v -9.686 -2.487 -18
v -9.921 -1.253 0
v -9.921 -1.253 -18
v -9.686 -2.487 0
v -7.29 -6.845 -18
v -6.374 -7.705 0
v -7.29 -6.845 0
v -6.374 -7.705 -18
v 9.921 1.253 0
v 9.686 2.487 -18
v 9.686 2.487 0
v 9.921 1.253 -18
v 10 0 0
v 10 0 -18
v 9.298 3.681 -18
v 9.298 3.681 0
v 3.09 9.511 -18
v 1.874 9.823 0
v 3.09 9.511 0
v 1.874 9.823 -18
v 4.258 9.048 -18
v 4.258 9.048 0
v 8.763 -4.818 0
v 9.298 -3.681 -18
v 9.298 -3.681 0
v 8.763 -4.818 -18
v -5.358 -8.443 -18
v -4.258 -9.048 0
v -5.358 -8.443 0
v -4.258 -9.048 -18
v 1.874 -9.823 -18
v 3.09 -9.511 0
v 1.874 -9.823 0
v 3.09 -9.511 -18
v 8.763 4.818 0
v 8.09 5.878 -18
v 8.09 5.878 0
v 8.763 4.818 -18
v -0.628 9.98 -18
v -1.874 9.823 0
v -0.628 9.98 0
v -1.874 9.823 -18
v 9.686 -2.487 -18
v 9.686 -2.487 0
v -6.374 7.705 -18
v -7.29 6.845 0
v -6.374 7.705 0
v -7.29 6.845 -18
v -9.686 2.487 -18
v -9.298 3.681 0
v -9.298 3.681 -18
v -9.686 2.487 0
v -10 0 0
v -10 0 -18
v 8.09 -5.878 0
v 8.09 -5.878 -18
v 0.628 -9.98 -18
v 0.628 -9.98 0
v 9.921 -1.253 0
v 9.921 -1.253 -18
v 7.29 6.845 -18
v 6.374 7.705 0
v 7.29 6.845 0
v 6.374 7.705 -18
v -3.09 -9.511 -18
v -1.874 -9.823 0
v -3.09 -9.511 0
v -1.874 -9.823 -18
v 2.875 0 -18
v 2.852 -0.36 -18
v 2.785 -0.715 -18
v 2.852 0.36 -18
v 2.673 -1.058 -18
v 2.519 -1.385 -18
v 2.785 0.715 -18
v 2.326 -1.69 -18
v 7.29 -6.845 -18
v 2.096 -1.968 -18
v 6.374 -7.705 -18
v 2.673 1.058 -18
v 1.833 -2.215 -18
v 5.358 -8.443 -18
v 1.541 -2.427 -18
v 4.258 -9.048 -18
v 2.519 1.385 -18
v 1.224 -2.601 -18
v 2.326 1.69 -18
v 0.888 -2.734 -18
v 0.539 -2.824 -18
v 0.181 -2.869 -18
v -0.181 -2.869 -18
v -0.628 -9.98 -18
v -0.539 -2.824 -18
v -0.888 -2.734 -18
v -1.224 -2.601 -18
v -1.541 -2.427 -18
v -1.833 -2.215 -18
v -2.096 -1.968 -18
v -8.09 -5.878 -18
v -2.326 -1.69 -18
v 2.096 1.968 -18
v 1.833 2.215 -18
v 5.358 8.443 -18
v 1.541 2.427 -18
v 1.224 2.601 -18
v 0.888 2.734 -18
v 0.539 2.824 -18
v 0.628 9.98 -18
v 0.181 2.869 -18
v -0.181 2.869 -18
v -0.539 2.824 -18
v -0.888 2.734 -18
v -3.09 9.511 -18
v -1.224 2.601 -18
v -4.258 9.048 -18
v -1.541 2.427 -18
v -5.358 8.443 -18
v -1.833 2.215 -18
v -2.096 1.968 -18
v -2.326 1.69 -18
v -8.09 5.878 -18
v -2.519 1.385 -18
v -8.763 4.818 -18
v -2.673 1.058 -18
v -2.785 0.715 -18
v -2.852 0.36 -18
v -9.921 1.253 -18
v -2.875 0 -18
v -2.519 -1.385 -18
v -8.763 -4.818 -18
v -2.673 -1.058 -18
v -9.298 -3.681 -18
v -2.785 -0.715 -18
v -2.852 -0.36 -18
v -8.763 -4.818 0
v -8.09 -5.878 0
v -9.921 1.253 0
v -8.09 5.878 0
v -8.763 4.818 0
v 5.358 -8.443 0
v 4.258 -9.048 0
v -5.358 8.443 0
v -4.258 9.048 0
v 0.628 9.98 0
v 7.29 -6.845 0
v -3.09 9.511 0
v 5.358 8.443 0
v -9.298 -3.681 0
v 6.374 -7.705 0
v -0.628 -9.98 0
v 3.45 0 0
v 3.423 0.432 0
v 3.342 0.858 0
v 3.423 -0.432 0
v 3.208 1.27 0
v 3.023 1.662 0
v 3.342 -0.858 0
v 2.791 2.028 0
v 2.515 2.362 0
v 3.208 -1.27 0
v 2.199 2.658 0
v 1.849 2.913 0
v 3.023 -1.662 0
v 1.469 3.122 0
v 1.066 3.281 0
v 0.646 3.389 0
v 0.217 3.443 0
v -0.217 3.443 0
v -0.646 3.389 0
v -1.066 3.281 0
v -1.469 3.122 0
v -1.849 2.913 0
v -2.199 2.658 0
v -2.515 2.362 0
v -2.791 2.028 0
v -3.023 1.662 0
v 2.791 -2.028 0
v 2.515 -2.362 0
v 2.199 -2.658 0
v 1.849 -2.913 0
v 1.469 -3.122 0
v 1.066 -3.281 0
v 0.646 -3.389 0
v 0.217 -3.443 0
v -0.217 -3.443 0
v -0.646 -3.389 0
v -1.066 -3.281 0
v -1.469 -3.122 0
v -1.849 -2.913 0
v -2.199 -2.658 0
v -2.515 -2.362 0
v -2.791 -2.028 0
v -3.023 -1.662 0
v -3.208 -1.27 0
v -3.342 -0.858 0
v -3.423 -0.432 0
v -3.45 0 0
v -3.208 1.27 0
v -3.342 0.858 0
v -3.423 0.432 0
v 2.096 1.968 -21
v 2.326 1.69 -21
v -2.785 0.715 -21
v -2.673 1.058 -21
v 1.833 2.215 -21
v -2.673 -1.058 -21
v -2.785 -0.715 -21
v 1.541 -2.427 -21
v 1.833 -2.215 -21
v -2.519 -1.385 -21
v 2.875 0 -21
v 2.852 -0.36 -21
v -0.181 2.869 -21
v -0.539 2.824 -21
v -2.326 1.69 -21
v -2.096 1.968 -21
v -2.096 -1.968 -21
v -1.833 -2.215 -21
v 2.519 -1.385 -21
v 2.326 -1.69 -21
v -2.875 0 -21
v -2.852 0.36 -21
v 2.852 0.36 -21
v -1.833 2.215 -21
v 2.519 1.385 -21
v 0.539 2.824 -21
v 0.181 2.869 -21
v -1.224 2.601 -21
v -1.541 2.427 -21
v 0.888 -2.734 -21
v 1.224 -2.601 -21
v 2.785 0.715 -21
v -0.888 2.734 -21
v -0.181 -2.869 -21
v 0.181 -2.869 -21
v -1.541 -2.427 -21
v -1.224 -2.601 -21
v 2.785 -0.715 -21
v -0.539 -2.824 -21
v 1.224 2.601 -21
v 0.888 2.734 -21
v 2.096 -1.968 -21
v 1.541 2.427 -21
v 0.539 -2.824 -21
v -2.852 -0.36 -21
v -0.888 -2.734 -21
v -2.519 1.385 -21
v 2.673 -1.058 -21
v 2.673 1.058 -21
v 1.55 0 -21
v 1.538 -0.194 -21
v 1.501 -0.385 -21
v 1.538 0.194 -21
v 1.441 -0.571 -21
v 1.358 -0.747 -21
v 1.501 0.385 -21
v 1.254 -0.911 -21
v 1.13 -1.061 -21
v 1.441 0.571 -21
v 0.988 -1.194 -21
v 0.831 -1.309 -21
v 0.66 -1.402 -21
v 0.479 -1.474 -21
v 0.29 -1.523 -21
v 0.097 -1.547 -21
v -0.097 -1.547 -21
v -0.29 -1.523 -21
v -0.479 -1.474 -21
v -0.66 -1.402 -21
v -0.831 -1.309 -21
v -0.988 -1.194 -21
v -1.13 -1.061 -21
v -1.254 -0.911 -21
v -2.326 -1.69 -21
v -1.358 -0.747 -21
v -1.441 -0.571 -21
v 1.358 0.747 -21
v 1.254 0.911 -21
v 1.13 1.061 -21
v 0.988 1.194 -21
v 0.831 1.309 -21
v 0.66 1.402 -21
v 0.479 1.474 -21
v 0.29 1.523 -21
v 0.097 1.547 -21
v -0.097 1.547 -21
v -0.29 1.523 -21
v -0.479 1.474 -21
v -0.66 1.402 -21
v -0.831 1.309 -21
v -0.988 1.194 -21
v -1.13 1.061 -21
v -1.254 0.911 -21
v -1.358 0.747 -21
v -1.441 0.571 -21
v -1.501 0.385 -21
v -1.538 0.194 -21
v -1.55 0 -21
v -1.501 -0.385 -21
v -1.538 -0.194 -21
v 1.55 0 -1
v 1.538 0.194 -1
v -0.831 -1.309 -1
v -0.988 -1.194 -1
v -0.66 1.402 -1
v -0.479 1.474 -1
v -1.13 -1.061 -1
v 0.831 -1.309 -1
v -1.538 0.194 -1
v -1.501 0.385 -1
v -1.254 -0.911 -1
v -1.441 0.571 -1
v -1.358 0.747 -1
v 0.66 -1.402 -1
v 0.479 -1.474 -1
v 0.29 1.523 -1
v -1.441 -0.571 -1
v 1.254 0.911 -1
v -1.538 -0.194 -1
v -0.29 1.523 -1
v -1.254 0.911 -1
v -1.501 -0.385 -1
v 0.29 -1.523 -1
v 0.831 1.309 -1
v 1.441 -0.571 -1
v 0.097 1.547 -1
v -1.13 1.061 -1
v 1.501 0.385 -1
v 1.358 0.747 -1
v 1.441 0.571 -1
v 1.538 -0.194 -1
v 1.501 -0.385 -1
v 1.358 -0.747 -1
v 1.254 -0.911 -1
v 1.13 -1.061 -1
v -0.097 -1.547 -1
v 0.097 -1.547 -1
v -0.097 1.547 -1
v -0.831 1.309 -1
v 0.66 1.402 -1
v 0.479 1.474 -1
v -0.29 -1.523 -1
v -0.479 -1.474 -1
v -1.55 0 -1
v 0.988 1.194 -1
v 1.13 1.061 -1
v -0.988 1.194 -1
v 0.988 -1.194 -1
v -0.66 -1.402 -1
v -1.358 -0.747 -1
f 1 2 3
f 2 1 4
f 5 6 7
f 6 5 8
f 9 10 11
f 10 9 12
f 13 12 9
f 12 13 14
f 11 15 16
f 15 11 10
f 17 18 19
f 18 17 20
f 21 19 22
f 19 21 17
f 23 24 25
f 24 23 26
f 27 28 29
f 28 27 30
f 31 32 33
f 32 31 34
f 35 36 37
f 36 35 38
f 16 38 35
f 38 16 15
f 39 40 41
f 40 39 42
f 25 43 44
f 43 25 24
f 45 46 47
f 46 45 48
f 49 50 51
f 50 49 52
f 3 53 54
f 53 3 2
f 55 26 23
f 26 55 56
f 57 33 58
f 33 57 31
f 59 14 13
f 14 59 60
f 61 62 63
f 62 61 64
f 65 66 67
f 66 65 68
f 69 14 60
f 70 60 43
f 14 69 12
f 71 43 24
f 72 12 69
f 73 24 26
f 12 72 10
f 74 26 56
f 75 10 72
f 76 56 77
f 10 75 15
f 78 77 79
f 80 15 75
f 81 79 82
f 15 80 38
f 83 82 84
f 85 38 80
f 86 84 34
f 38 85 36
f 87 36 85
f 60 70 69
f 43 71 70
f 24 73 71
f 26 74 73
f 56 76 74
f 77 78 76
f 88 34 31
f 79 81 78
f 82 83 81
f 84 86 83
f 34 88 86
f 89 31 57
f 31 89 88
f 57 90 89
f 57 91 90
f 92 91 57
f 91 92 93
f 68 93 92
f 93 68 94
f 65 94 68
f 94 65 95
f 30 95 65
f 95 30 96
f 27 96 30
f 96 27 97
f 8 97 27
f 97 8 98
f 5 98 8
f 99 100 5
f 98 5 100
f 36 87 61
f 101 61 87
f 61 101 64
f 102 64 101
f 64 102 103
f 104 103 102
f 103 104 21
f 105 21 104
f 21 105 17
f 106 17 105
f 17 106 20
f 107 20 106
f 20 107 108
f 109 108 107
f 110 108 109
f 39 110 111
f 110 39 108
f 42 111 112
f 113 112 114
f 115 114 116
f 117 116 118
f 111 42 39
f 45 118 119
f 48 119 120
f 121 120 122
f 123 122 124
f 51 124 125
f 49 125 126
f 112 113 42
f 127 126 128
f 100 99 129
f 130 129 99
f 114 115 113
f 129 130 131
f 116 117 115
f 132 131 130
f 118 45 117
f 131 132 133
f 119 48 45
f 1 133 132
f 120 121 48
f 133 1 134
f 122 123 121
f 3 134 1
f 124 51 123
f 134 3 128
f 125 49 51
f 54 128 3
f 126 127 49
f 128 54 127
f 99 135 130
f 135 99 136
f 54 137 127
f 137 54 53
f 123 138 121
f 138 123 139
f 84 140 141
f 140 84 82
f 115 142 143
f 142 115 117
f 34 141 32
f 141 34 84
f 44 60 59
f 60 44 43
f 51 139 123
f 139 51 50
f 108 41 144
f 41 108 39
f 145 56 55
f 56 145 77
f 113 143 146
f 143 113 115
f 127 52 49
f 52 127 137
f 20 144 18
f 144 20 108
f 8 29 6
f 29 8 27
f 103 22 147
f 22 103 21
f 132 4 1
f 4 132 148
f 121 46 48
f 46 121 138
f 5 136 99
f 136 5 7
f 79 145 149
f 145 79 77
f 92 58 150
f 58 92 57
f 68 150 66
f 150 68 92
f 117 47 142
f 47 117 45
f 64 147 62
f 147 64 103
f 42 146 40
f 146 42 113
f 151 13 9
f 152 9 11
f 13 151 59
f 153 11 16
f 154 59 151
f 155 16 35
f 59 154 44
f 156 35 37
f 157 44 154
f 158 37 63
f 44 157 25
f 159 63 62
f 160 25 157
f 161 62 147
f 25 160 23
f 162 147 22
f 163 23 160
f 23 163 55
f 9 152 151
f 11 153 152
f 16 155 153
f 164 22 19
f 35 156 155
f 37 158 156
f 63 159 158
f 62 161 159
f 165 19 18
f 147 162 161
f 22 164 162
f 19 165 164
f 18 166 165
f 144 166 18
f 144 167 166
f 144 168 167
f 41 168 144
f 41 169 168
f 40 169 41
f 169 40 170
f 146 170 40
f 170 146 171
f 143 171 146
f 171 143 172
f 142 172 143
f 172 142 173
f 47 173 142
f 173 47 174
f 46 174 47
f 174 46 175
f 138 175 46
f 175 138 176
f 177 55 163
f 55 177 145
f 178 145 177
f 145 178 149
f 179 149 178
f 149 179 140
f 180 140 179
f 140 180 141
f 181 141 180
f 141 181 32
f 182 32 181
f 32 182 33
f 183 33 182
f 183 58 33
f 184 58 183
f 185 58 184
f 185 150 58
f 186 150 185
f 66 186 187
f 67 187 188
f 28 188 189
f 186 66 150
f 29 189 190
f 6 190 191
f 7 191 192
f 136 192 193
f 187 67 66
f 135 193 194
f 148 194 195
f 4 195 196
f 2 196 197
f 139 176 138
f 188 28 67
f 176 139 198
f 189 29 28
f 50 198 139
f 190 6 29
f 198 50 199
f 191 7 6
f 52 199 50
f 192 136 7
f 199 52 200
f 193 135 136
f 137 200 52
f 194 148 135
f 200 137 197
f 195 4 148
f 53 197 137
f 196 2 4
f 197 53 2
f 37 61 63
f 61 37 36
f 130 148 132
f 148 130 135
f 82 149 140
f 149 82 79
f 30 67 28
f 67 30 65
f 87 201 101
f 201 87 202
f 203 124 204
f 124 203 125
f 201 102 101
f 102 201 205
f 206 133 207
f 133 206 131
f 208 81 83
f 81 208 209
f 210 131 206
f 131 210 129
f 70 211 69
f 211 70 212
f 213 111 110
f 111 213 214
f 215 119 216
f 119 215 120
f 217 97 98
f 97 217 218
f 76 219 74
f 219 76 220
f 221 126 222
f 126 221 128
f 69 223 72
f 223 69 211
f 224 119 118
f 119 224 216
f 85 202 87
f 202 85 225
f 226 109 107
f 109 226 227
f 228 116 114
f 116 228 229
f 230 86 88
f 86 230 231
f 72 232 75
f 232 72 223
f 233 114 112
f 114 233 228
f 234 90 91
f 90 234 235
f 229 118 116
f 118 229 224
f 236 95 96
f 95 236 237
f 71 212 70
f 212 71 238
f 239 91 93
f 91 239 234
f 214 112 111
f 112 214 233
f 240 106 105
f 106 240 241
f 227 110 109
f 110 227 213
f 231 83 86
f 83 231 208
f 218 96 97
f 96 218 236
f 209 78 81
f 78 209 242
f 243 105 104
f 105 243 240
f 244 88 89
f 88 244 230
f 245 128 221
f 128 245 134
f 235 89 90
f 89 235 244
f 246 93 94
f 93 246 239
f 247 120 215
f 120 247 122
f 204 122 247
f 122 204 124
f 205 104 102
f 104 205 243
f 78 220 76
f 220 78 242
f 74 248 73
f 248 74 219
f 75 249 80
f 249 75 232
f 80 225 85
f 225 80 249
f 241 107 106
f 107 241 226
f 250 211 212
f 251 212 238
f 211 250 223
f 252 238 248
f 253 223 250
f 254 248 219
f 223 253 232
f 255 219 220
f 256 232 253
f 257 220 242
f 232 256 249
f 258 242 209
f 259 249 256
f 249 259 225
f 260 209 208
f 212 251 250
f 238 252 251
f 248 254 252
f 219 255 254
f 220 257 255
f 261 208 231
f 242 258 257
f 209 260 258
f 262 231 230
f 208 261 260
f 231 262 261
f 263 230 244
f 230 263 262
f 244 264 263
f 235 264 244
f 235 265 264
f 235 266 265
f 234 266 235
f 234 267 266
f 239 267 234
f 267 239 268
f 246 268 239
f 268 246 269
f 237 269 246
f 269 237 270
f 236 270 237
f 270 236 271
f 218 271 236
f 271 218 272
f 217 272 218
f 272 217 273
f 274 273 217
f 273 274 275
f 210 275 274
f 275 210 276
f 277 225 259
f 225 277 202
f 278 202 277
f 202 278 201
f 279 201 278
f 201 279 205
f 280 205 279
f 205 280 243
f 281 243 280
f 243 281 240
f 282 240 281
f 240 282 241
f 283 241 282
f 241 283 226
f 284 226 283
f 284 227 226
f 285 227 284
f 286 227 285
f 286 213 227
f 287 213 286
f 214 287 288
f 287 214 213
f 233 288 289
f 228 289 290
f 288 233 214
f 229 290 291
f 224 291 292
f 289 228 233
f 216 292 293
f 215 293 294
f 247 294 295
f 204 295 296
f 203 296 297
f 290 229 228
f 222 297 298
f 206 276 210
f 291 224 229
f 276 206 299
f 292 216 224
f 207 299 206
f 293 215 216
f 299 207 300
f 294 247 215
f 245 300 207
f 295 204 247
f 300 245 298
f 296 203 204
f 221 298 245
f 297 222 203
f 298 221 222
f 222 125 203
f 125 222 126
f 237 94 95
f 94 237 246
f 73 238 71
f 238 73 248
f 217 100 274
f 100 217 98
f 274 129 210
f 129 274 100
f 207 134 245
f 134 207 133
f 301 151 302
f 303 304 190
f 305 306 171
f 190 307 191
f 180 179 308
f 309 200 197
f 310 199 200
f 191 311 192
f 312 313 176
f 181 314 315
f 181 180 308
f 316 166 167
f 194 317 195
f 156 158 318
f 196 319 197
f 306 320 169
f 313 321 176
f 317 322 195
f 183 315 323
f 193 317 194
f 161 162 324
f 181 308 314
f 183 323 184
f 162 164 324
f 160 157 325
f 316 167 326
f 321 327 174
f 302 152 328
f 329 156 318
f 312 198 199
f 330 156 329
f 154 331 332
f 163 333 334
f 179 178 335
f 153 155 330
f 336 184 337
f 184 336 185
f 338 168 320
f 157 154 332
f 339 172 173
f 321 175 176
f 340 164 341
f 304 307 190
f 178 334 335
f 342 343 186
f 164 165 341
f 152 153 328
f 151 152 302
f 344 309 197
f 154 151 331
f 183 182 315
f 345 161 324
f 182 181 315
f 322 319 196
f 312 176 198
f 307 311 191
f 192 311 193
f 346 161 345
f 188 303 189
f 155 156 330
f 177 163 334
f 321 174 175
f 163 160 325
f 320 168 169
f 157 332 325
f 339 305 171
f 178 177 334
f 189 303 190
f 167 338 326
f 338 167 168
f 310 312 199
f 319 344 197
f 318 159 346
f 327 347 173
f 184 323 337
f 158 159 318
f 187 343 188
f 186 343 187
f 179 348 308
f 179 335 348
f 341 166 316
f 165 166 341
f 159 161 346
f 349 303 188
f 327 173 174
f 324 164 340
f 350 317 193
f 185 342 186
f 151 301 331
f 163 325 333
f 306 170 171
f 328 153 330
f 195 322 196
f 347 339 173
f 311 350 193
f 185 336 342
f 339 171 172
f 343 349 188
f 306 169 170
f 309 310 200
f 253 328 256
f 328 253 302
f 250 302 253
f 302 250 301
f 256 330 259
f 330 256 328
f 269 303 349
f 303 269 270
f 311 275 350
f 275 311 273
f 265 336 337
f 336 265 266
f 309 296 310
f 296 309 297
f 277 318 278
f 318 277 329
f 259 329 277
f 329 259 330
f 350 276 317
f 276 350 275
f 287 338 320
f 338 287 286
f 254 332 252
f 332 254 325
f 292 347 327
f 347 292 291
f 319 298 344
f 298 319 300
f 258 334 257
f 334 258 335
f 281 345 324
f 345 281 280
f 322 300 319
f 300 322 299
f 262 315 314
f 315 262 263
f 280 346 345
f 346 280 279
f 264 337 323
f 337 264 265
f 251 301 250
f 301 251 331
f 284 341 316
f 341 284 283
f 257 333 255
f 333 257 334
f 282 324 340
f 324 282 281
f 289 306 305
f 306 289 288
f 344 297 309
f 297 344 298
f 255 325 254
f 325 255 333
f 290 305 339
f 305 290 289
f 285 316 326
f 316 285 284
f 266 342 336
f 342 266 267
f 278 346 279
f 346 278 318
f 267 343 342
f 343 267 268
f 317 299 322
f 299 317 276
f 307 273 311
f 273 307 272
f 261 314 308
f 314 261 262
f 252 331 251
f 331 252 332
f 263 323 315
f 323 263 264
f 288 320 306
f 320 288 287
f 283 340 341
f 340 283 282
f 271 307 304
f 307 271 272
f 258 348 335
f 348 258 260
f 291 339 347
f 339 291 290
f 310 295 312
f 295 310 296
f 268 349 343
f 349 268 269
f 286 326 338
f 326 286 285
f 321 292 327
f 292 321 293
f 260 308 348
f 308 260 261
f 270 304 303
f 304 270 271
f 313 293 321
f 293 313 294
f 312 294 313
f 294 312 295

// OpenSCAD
$fn = 50;


difference() {
	union() {
		translate(v = [0, 0, -18.0000000000]) {
			cylinder(h = 18, r = 10.0000000000);
		}
		#translate(v = [0, 0, -21.0000000000]) {
			cylinder(h = 21, r = 2.8750000000);
		}
	}
	union() {
		translate(v = [0, 0, 0]) {
			rotate(a = [0, 0, 0]) {
				difference() {
					union() {
						translate(v = [0, 0, -21.0000000000]) {
							cylinder(h = 21, r = 1.2500000000);
						}
						translate(v = [0, 0, -1.0000000000]) {
							cylinder(h = 1.0000000000, r1 = 1.5500000000, r2 = 3.4500000000);
						}
						translate(v = [0, 0, -21.0000000000]) {
							cylinder(h = 21, r = 1.5500000000);
						}
						translate(v = [0, 0, -21.0000000000]) {
							cylinder(h = 21, r = 1.2500000000);
						}
					}
					union();
				}
			}
		}
	}
}
